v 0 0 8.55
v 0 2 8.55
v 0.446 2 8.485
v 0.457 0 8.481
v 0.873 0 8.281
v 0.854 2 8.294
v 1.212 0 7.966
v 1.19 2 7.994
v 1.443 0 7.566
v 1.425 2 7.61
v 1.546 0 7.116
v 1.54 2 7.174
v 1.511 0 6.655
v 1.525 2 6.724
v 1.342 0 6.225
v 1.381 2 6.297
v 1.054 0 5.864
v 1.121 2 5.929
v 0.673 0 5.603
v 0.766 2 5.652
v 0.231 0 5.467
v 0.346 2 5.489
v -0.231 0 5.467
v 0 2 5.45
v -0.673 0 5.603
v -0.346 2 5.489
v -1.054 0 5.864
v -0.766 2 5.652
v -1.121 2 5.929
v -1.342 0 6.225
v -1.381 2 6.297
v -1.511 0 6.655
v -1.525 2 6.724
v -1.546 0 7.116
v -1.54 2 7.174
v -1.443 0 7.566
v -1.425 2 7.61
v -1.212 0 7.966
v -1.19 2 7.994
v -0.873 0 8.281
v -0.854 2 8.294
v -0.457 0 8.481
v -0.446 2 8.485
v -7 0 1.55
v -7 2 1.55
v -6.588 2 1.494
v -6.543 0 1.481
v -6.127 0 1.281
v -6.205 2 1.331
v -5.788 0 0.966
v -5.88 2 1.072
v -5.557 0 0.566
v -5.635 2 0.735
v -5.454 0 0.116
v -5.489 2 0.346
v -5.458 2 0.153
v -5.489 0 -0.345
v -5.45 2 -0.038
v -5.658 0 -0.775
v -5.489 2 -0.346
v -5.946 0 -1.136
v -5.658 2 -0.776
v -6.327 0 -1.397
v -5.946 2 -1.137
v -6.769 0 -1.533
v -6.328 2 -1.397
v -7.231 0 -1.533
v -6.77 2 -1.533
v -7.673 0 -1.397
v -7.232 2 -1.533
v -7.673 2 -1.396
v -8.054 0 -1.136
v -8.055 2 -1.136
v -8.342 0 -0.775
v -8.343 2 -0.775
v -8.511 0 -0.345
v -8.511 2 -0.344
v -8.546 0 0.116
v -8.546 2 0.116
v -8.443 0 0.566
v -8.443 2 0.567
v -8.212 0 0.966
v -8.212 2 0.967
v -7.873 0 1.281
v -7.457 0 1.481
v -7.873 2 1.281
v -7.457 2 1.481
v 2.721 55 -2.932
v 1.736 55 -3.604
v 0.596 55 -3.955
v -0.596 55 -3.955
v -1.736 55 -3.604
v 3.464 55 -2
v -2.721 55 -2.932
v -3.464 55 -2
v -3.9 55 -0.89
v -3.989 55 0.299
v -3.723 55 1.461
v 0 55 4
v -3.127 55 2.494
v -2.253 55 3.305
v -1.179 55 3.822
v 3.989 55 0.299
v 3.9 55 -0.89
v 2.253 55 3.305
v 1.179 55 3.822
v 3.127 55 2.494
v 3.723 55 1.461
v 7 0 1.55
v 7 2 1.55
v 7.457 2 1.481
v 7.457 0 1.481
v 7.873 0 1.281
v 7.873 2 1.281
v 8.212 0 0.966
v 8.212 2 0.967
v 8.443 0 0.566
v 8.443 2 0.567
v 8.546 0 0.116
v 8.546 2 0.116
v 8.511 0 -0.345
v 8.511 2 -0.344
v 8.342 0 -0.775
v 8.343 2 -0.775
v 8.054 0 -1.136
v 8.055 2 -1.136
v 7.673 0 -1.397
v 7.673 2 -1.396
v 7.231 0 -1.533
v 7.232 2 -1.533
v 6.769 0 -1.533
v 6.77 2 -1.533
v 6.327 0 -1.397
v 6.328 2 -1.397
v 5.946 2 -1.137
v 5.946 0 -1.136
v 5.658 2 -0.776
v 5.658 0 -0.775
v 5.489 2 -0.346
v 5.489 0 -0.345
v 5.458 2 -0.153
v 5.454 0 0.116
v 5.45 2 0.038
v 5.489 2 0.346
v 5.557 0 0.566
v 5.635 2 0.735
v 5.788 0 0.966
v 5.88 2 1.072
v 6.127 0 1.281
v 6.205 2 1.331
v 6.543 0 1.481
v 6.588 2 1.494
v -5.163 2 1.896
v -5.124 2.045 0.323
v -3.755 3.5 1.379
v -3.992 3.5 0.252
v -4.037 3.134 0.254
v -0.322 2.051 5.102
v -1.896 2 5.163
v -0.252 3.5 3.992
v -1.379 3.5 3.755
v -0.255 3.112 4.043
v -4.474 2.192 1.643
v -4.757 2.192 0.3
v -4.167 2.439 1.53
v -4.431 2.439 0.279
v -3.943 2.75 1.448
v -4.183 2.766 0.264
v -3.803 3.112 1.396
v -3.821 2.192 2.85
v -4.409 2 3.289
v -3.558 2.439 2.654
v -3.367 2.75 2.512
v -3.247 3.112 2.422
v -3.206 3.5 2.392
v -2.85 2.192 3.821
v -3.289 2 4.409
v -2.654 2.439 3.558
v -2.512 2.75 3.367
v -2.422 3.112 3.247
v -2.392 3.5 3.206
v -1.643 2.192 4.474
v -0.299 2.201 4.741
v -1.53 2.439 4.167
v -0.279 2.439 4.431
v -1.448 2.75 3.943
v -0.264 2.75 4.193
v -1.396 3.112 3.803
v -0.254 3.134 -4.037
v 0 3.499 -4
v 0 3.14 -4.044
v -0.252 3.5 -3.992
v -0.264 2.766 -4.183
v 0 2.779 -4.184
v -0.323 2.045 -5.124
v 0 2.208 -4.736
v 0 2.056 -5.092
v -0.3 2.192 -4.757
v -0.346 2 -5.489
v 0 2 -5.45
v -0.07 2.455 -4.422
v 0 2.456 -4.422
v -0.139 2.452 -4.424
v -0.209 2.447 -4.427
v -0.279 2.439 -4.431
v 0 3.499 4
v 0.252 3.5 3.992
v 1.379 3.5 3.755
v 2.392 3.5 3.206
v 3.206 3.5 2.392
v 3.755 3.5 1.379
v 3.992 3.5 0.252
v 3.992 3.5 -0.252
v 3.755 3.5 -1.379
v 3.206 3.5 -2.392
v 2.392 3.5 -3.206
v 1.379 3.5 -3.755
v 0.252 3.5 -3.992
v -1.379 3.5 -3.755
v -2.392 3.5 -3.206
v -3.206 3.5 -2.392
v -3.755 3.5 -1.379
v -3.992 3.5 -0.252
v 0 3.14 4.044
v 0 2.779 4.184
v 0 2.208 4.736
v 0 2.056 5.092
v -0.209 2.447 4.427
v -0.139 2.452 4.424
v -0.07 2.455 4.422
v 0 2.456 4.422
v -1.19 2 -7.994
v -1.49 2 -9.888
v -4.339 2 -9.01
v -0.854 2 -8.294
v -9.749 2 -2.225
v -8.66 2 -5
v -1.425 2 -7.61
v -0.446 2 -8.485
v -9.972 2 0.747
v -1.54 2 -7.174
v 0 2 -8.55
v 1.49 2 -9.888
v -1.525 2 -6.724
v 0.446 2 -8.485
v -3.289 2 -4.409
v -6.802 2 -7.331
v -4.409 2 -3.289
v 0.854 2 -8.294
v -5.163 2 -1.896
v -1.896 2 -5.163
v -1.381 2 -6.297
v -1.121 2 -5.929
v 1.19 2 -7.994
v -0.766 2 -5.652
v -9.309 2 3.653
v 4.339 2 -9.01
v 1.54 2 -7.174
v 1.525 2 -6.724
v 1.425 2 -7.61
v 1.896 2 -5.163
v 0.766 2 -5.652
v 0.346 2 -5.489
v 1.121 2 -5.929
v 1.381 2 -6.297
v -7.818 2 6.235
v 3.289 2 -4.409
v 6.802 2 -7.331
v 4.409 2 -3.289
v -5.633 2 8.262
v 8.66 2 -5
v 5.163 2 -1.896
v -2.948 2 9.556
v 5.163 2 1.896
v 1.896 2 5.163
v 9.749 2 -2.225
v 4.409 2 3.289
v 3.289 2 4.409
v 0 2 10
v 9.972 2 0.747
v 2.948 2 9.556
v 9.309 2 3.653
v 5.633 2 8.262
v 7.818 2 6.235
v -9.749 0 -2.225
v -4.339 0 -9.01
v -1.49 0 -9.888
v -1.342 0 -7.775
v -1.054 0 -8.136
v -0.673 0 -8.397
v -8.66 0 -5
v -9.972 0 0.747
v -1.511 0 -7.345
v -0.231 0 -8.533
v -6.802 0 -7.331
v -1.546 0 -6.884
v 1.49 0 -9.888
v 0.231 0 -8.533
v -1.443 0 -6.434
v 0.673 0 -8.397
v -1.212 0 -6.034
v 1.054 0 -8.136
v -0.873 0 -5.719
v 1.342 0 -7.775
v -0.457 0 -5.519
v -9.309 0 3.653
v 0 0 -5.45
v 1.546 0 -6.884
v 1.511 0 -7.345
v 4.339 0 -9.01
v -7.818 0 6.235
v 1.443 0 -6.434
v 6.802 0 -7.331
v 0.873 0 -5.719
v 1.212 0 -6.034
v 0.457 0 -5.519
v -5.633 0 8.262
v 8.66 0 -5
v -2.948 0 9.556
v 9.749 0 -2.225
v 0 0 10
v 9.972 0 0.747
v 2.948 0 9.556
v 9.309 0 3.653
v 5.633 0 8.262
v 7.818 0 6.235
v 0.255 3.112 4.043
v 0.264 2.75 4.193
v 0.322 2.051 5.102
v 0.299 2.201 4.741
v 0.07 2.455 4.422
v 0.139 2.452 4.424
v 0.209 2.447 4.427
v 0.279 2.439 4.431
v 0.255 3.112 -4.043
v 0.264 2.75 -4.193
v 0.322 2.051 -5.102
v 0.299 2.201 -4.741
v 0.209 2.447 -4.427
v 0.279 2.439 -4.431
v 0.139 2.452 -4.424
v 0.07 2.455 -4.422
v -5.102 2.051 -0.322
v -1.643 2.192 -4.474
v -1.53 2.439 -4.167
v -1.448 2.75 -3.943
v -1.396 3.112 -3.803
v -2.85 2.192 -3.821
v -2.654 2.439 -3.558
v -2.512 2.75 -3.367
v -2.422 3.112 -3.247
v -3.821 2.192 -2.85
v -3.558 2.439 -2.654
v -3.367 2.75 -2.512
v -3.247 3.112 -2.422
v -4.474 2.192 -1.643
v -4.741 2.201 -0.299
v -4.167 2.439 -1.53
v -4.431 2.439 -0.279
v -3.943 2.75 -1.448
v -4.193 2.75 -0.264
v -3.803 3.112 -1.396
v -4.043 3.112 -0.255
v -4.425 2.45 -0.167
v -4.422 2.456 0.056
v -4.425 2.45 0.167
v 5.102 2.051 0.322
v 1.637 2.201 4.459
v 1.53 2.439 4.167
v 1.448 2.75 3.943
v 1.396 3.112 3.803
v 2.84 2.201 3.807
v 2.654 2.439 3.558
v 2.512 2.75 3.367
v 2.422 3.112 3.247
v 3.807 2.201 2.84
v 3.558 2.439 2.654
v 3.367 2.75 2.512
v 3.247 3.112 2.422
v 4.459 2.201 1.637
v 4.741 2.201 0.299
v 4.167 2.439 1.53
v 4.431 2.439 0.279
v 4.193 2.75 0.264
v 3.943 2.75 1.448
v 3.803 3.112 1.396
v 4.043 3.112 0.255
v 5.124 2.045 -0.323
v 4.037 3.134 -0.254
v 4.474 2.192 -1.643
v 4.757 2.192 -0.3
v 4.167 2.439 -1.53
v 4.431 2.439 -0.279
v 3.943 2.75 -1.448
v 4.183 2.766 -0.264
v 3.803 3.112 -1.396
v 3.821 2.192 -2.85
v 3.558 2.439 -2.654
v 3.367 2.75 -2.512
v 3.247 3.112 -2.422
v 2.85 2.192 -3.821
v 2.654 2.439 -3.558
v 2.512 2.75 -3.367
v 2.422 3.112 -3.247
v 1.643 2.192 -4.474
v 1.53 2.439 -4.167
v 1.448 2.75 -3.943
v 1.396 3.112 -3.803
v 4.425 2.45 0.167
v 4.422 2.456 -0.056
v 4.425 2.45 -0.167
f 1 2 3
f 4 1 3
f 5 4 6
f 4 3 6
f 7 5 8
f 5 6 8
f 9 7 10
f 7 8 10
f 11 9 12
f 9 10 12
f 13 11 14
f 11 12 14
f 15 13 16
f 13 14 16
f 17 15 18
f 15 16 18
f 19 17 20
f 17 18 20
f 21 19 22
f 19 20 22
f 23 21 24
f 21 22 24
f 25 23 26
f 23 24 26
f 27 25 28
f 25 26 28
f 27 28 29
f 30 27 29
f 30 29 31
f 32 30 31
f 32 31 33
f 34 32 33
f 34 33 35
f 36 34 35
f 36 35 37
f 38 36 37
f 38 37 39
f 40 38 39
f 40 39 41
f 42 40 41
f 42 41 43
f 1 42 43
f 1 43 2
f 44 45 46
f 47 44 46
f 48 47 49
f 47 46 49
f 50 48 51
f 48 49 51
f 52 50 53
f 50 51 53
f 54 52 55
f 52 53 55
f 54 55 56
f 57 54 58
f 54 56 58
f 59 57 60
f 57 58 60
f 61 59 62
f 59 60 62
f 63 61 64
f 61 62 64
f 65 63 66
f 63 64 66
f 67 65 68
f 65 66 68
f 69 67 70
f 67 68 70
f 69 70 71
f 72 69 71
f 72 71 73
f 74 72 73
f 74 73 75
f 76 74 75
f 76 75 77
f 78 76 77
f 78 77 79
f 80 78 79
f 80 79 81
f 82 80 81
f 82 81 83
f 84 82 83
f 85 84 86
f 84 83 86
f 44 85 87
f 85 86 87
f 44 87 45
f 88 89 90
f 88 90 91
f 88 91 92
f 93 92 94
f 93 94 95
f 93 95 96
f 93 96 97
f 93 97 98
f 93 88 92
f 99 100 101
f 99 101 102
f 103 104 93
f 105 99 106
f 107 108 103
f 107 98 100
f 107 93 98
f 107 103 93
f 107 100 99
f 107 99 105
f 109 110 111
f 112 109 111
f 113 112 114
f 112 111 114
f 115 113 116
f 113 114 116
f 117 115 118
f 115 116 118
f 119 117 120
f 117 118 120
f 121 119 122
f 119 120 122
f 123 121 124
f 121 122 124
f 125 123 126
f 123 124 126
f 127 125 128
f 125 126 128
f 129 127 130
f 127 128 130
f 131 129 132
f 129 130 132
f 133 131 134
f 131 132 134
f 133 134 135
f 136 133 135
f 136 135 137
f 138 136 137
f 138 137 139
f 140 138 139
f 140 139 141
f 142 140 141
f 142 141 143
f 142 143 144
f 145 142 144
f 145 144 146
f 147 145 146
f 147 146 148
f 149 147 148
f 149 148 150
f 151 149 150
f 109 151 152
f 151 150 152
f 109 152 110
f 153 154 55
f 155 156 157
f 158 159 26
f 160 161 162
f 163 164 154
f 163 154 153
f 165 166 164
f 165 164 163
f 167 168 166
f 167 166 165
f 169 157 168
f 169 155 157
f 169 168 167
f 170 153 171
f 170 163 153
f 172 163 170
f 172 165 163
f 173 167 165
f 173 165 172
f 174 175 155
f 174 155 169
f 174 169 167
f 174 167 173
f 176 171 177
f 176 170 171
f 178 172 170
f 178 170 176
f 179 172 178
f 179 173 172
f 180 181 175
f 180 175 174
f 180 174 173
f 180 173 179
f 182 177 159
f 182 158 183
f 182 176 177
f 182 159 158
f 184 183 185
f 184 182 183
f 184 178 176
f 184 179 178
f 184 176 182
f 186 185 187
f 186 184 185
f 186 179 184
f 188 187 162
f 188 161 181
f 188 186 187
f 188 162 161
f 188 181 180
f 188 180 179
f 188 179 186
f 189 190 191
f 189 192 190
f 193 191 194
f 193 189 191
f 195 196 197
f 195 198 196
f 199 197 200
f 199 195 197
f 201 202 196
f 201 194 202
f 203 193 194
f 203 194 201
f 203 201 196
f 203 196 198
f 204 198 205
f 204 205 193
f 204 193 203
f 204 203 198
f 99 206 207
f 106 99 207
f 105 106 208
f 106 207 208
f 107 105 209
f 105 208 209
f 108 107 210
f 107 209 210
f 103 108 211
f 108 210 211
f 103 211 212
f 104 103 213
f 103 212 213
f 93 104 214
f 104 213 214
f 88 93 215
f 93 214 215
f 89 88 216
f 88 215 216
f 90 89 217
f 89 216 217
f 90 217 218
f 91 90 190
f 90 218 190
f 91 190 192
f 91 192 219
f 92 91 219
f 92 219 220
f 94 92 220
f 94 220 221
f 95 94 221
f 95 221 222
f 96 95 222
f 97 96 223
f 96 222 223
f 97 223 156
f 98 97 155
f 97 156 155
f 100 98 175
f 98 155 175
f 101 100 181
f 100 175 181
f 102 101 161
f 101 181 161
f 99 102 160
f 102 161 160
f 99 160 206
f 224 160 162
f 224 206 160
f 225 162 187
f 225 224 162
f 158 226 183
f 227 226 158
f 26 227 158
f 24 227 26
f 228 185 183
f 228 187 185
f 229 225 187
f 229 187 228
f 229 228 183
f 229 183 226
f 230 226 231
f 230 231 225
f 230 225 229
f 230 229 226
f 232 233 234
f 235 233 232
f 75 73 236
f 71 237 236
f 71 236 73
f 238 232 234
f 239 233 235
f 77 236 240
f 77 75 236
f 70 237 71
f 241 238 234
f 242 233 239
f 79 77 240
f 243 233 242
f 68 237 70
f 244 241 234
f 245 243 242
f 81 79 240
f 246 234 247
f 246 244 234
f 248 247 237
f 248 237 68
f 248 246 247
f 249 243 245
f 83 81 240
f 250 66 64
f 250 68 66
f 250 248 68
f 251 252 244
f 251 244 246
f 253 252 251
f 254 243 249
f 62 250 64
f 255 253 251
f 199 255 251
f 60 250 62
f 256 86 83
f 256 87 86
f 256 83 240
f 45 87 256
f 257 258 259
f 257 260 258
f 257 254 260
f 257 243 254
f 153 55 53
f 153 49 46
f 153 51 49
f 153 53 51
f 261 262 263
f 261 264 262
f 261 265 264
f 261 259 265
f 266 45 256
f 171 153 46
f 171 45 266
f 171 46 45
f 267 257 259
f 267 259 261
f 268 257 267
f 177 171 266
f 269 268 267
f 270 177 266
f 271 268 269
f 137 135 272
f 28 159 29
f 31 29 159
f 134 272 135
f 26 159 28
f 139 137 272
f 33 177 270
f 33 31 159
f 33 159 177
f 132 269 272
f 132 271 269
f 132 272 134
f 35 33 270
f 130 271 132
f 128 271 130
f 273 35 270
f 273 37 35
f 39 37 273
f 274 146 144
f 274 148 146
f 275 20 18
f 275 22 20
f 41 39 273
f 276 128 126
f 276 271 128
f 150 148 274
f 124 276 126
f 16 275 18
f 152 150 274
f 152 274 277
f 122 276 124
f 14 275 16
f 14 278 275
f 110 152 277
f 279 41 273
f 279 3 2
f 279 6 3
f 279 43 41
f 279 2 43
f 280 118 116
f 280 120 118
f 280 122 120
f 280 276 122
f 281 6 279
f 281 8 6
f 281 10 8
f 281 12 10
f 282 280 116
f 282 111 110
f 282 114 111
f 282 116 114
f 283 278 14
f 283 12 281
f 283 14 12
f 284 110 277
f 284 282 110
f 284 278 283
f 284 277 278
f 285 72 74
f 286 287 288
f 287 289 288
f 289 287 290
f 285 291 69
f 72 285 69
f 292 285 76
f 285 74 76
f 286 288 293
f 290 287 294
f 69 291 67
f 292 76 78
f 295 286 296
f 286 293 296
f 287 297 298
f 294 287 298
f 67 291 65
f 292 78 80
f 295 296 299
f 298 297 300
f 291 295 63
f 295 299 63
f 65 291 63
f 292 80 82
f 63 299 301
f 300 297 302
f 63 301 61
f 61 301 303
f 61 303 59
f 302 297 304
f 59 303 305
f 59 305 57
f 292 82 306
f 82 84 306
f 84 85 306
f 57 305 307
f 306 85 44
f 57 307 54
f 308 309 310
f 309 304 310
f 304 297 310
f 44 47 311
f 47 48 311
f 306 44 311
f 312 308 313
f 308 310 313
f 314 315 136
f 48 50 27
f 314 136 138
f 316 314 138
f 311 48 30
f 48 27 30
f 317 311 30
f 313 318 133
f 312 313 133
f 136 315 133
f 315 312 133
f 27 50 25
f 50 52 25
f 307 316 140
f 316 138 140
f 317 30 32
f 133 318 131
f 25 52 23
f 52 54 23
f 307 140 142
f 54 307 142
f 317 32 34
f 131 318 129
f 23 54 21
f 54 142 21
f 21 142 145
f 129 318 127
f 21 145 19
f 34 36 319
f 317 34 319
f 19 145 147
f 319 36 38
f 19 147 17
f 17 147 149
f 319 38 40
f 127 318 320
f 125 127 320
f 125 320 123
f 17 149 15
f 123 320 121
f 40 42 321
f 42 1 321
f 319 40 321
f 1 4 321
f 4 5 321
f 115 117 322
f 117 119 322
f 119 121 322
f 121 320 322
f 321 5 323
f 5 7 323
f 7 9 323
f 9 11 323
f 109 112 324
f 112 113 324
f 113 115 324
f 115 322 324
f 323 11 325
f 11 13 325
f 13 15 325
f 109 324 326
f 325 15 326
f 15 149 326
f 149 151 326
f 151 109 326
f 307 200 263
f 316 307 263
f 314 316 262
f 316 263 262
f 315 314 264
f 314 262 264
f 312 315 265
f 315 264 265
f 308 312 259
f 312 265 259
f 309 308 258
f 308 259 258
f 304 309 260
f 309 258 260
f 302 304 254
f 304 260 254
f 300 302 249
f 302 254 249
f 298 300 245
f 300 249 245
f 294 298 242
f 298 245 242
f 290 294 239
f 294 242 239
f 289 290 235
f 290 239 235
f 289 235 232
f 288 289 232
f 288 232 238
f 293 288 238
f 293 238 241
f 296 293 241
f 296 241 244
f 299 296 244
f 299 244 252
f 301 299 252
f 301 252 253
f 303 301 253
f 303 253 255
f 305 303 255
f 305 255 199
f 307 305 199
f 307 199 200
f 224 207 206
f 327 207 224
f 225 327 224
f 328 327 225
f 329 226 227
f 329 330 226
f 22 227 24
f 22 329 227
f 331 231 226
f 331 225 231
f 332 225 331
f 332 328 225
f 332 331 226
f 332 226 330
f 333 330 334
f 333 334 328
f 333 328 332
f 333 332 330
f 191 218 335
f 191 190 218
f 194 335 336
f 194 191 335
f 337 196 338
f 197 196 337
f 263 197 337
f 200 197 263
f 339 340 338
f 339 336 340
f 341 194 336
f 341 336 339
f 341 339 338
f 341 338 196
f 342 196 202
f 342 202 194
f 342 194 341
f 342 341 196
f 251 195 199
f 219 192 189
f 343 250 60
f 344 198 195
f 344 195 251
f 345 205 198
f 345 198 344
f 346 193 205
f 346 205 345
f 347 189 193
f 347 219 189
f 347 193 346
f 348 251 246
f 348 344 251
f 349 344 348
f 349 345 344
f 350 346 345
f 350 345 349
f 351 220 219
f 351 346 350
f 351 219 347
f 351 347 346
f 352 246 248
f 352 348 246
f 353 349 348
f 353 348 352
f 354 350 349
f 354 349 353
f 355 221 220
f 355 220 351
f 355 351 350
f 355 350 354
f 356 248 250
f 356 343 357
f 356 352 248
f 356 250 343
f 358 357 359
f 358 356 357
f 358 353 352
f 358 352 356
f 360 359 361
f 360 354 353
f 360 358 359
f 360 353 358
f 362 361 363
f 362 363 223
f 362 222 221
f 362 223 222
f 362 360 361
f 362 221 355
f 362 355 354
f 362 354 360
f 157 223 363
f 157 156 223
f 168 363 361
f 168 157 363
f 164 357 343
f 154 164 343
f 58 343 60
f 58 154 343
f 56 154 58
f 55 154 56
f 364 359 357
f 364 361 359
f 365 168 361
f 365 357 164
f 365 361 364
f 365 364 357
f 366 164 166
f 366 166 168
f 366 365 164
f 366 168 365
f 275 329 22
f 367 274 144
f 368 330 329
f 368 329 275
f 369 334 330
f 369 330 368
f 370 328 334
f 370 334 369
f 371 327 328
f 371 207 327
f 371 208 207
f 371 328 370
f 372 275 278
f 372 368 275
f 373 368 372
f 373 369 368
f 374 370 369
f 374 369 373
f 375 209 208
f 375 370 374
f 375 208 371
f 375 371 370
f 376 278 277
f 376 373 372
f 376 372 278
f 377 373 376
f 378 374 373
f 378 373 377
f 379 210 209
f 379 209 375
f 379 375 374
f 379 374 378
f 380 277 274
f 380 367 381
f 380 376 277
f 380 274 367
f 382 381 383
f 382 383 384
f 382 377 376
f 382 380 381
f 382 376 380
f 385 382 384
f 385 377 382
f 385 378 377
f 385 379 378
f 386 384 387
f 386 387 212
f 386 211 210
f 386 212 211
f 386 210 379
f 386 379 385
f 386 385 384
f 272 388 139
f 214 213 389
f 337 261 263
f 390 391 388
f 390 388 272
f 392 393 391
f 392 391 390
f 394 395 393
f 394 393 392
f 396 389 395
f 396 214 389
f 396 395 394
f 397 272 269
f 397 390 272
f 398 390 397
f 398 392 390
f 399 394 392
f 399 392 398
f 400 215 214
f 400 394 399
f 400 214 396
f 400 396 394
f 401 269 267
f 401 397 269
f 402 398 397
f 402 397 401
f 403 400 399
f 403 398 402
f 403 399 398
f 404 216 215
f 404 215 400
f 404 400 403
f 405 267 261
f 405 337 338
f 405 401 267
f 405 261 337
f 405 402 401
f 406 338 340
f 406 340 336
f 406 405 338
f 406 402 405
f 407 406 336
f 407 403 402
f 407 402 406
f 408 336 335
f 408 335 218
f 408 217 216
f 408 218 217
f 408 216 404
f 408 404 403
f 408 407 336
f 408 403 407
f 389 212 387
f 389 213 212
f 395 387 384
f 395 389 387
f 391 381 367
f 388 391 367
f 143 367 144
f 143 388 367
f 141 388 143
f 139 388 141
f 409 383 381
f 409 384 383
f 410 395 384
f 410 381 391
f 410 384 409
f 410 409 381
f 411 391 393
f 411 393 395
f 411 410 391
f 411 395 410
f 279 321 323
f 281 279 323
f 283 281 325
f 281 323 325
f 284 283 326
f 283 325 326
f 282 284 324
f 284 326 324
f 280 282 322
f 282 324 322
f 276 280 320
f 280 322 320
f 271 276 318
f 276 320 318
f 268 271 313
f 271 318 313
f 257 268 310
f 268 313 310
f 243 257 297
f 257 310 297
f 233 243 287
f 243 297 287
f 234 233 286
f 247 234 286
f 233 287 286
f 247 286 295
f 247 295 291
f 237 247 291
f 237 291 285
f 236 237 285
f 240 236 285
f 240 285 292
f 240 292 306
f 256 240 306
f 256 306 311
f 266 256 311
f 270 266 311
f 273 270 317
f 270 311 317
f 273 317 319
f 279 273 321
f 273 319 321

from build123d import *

# Parameters (mm, degrees)
SKETCH_1_R          = 10
EXTRUDE_1_DEPTH     = 2
SKETCH_2_R          = 1.55
CUT_EXTRUDE_1_DEPTH = 2
SKETCH_3_R          = 4
EXTRUDE_2_DEPTH     = 53
FILLET_1_R          = 1.5


with BuildPart() as part:
    # 草图1 → 凸台-拉伸1 (new body)
    with BuildSketch(Plane(origin=(0, 0, 0), x_dir=(1, 0, 0), z_dir=(0, 1, 0))):
        with Locations(Location((0, 0, 0), (0, 0, 270))):
            Circle(SKETCH_1_R)
    extrude(amount=EXTRUDE_1_DEPTH)

    # 草图2 → 切除-拉伸1 (cut)
    with BuildSketch(Plane(origin=(0, 2, 0), x_dir=(1, 0, 0), z_dir=(0, 1, 0))):
        with Locations(Location((0, 7, 0), (0, 0, 270))):
            Circle(SKETCH_2_R)
        with Locations(Location((7, 0, 0), (0, 0, 270))):
            Circle(SKETCH_2_R)
        with Locations(Location((-7, 0, 0), (0, 0, 270))):
            Circle(SKETCH_2_R)
        with Locations(Location((0, -7, 0), (0, 0, 270))):
            Circle(SKETCH_2_R)
    extrude(amount=-CUT_EXTRUDE_1_DEPTH, mode=Mode.SUBTRACT)

    # 草图3 → 凸台-拉伸2 (add)
    with BuildSketch(Plane(origin=(0, 2, 0), x_dir=(1, 0, 0), z_dir=(0, 1, 0))):
        with Locations(Location((0, 0, 0), (0, 0, 270))):
            Circle(SKETCH_3_R)
    extrude(amount=EXTRUDE_2_DEPTH)

    # 圆角1
    fillet_1_edges = [part.edges().sort_by_distance(p)[0] for p in [
        (0, 2, -4),
    ]]
    fillet(fillet_1_edges, radius=FILLET_1_R)


solid = part.part
